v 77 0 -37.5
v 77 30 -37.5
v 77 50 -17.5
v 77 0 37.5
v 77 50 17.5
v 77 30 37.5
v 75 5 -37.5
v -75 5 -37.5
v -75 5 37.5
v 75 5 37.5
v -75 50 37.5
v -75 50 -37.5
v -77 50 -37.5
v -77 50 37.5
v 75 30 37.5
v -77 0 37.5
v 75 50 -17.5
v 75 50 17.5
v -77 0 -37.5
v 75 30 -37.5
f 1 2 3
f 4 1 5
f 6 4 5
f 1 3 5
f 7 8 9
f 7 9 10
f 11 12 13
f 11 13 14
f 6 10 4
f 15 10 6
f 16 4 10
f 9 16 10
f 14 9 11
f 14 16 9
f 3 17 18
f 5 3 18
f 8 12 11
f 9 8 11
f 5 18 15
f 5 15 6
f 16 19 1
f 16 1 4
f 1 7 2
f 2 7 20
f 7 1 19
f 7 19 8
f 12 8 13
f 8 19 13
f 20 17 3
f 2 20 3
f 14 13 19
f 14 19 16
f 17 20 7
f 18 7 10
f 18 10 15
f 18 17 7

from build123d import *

# Parameters (mm, degrees)
SKETCH1_W           = 150
SKETCH1_H           = 75
BOSS_EXTRUDE1_DEPTH = 5
SKETCH2_W           = 75
SKETCH2_H           = 50
BOSS_EXTRUDE2_DEPTH = 2
CHAMFER1_SIZE       = 20


with BuildPart() as part:
    # Sketch1 → Boss-Extrude1 (new body)
    with BuildSketch(Plane(origin=(0, 0, 0), x_dir=(1, 0, 0), z_dir=(0, 1, 0))):
        Rectangle(SKETCH1_W, SKETCH1_H)
    extrude(amount=BOSS_EXTRUDE1_DEPTH)

    # Sketch2 → Boss-Extrude2 (add)
    with BuildSketch(Plane.ZY.offset(75)):
        with Locations((0, 25)):
            Rectangle(SKETCH2_W, SKETCH2_H)
    boss_extrude2 = extrude(amount=BOSS_EXTRUDE2_DEPTH)

    # Mirror1: Boss-Extrude2 across plane
    add(boss_extrude2.mirror(Plane(origin=(0, 0, 0), x_dir=(0, 0, 1), z_dir=(1, 0, 0))))

    # Chamfer1
    chamfer1_edges = [part.edges().sort_by_distance(p)[0] for p in [
        (76, 50, -37.5),
        (76, 50, 37.5),
    ]]
    chamfer(chamfer1_edges, length=CHAMFER1_SIZE)


solid = part.part
